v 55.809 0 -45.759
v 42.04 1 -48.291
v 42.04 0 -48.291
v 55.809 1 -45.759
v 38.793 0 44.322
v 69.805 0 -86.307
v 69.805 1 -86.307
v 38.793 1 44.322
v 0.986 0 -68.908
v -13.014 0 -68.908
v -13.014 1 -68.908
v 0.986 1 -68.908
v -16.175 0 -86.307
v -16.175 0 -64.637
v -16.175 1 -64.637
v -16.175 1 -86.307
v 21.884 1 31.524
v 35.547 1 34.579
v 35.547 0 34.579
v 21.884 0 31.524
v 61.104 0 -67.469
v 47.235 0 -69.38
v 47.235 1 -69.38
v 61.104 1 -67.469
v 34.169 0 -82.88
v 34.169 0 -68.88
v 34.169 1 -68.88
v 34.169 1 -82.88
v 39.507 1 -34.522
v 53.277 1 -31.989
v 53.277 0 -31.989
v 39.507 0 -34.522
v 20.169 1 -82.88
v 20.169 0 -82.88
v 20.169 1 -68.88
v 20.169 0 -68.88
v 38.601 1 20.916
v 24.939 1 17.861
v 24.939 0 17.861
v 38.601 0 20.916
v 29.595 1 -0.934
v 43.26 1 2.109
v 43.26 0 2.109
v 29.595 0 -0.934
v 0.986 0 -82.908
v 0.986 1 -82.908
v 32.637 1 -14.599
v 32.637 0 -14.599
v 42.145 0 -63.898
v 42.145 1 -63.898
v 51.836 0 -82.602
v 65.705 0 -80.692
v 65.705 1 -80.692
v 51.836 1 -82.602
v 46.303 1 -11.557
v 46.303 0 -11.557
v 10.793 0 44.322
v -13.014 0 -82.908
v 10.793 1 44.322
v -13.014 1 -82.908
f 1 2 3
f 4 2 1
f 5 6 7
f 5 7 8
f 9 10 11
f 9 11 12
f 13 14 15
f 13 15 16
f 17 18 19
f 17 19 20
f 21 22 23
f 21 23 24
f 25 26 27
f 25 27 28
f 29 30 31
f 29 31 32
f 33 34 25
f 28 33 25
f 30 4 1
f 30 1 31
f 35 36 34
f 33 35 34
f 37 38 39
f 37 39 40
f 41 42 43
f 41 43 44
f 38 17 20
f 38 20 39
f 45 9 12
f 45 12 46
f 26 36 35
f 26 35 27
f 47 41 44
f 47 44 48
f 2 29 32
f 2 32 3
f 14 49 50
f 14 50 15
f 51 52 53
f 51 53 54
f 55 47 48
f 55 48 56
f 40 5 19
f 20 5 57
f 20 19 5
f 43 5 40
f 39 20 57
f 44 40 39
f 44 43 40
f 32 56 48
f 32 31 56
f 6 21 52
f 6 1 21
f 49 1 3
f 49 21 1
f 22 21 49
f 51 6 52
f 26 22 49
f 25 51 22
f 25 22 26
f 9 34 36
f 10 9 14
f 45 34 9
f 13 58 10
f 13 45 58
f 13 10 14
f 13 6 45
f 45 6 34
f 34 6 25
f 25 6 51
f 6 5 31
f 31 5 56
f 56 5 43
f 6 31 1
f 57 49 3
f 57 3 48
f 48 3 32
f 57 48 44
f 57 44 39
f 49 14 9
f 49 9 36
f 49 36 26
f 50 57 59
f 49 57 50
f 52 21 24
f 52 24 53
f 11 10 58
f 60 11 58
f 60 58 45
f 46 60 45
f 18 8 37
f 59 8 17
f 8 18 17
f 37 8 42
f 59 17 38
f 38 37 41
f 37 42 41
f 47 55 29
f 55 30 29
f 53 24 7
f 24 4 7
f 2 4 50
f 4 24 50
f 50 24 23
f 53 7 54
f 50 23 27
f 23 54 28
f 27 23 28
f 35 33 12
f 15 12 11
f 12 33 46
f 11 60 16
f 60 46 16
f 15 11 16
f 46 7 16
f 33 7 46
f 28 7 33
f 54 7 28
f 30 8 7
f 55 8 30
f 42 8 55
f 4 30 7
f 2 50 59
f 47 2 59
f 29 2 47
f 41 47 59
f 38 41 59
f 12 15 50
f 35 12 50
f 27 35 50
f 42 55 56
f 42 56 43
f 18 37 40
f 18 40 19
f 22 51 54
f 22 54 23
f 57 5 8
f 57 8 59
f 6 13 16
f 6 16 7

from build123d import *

# Parameters (mm, degrees)
BOSS_EXTRUDE1_DEPTH = 1
SKETCH2_W           = 14
SKETCH2_H           = 14
CUT_EXTRUDE1_DEPTH  = 112.007775968
CUT_EXTRUDE2_DEPTH  = 112.007775968


with BuildPart() as part:
    # Sketch1 → Boss-Extrude1 (new body)
    with BuildSketch(Plane(origin=(0, 0, 0), x_dir=(1, 0, 0), z_dir=(0, 1, 0))):
        Polygon((-16.174938897, 86.307472271), (69.805061103, 86.307472271), (38.792758309, -44.321715415), (10.792758309, -44.321715415), (42.145061103, 63.898255059), (-16.174938897, 64.637472271), align=None)
    extrude(amount=BOSS_EXTRUDE1_DEPTH)

    # Sketch2 → Cut-Extrude1 (cut, through all)
    with BuildSketch(Plane(origin=(0, 0, 0), x_dir=(1, 0, 0), z_dir=(0, 1, 0))):
        with Locations((-6.014238297, 75.907608588)):
            Rectangle(SKETCH2_W, SKETCH2_H)
        with Locations((27.168678058, 75.880355848)):
            Rectangle(SKETCH2_W, SKETCH2_H)
        Polygon((47.235283442, 69.379844428), (61.104296679, 67.469223626), (65.705307468, 80.691579684), (51.836294232, 82.602200486), align=None)
    extrude(amount=CUT_EXTRUDE1_DEPTH, mode=Mode.SUBTRACT)

    # Sketch3 → Cut-Extrude2 (cut, through all)
    with BuildSketch(Plane(origin=(0, 1, 0), x_dir=(1, 0, 0), z_dir=(0, 1, 0))):
        Polygon((42.039756476, 48.29086531), (55.808834799, 45.758577387), (53.276546876, 31.989499063), (39.507468553, 34.521786986), align=None)
        Polygon((46.302698973, 11.55658303), (43.259967448, -2.108766759), (29.594617659, 0.933964766), (32.637349184, 14.599314555), align=None)
        Polygon((38.601429809, -20.915974937), (35.546831549, -34.578677066), (21.88412942, -31.524078805), (24.93872768, -17.861376676), align=None)
    extrude(amount=-CUT_EXTRUDE2_DEPTH, mode=Mode.SUBTRACT)


solid = part.part
